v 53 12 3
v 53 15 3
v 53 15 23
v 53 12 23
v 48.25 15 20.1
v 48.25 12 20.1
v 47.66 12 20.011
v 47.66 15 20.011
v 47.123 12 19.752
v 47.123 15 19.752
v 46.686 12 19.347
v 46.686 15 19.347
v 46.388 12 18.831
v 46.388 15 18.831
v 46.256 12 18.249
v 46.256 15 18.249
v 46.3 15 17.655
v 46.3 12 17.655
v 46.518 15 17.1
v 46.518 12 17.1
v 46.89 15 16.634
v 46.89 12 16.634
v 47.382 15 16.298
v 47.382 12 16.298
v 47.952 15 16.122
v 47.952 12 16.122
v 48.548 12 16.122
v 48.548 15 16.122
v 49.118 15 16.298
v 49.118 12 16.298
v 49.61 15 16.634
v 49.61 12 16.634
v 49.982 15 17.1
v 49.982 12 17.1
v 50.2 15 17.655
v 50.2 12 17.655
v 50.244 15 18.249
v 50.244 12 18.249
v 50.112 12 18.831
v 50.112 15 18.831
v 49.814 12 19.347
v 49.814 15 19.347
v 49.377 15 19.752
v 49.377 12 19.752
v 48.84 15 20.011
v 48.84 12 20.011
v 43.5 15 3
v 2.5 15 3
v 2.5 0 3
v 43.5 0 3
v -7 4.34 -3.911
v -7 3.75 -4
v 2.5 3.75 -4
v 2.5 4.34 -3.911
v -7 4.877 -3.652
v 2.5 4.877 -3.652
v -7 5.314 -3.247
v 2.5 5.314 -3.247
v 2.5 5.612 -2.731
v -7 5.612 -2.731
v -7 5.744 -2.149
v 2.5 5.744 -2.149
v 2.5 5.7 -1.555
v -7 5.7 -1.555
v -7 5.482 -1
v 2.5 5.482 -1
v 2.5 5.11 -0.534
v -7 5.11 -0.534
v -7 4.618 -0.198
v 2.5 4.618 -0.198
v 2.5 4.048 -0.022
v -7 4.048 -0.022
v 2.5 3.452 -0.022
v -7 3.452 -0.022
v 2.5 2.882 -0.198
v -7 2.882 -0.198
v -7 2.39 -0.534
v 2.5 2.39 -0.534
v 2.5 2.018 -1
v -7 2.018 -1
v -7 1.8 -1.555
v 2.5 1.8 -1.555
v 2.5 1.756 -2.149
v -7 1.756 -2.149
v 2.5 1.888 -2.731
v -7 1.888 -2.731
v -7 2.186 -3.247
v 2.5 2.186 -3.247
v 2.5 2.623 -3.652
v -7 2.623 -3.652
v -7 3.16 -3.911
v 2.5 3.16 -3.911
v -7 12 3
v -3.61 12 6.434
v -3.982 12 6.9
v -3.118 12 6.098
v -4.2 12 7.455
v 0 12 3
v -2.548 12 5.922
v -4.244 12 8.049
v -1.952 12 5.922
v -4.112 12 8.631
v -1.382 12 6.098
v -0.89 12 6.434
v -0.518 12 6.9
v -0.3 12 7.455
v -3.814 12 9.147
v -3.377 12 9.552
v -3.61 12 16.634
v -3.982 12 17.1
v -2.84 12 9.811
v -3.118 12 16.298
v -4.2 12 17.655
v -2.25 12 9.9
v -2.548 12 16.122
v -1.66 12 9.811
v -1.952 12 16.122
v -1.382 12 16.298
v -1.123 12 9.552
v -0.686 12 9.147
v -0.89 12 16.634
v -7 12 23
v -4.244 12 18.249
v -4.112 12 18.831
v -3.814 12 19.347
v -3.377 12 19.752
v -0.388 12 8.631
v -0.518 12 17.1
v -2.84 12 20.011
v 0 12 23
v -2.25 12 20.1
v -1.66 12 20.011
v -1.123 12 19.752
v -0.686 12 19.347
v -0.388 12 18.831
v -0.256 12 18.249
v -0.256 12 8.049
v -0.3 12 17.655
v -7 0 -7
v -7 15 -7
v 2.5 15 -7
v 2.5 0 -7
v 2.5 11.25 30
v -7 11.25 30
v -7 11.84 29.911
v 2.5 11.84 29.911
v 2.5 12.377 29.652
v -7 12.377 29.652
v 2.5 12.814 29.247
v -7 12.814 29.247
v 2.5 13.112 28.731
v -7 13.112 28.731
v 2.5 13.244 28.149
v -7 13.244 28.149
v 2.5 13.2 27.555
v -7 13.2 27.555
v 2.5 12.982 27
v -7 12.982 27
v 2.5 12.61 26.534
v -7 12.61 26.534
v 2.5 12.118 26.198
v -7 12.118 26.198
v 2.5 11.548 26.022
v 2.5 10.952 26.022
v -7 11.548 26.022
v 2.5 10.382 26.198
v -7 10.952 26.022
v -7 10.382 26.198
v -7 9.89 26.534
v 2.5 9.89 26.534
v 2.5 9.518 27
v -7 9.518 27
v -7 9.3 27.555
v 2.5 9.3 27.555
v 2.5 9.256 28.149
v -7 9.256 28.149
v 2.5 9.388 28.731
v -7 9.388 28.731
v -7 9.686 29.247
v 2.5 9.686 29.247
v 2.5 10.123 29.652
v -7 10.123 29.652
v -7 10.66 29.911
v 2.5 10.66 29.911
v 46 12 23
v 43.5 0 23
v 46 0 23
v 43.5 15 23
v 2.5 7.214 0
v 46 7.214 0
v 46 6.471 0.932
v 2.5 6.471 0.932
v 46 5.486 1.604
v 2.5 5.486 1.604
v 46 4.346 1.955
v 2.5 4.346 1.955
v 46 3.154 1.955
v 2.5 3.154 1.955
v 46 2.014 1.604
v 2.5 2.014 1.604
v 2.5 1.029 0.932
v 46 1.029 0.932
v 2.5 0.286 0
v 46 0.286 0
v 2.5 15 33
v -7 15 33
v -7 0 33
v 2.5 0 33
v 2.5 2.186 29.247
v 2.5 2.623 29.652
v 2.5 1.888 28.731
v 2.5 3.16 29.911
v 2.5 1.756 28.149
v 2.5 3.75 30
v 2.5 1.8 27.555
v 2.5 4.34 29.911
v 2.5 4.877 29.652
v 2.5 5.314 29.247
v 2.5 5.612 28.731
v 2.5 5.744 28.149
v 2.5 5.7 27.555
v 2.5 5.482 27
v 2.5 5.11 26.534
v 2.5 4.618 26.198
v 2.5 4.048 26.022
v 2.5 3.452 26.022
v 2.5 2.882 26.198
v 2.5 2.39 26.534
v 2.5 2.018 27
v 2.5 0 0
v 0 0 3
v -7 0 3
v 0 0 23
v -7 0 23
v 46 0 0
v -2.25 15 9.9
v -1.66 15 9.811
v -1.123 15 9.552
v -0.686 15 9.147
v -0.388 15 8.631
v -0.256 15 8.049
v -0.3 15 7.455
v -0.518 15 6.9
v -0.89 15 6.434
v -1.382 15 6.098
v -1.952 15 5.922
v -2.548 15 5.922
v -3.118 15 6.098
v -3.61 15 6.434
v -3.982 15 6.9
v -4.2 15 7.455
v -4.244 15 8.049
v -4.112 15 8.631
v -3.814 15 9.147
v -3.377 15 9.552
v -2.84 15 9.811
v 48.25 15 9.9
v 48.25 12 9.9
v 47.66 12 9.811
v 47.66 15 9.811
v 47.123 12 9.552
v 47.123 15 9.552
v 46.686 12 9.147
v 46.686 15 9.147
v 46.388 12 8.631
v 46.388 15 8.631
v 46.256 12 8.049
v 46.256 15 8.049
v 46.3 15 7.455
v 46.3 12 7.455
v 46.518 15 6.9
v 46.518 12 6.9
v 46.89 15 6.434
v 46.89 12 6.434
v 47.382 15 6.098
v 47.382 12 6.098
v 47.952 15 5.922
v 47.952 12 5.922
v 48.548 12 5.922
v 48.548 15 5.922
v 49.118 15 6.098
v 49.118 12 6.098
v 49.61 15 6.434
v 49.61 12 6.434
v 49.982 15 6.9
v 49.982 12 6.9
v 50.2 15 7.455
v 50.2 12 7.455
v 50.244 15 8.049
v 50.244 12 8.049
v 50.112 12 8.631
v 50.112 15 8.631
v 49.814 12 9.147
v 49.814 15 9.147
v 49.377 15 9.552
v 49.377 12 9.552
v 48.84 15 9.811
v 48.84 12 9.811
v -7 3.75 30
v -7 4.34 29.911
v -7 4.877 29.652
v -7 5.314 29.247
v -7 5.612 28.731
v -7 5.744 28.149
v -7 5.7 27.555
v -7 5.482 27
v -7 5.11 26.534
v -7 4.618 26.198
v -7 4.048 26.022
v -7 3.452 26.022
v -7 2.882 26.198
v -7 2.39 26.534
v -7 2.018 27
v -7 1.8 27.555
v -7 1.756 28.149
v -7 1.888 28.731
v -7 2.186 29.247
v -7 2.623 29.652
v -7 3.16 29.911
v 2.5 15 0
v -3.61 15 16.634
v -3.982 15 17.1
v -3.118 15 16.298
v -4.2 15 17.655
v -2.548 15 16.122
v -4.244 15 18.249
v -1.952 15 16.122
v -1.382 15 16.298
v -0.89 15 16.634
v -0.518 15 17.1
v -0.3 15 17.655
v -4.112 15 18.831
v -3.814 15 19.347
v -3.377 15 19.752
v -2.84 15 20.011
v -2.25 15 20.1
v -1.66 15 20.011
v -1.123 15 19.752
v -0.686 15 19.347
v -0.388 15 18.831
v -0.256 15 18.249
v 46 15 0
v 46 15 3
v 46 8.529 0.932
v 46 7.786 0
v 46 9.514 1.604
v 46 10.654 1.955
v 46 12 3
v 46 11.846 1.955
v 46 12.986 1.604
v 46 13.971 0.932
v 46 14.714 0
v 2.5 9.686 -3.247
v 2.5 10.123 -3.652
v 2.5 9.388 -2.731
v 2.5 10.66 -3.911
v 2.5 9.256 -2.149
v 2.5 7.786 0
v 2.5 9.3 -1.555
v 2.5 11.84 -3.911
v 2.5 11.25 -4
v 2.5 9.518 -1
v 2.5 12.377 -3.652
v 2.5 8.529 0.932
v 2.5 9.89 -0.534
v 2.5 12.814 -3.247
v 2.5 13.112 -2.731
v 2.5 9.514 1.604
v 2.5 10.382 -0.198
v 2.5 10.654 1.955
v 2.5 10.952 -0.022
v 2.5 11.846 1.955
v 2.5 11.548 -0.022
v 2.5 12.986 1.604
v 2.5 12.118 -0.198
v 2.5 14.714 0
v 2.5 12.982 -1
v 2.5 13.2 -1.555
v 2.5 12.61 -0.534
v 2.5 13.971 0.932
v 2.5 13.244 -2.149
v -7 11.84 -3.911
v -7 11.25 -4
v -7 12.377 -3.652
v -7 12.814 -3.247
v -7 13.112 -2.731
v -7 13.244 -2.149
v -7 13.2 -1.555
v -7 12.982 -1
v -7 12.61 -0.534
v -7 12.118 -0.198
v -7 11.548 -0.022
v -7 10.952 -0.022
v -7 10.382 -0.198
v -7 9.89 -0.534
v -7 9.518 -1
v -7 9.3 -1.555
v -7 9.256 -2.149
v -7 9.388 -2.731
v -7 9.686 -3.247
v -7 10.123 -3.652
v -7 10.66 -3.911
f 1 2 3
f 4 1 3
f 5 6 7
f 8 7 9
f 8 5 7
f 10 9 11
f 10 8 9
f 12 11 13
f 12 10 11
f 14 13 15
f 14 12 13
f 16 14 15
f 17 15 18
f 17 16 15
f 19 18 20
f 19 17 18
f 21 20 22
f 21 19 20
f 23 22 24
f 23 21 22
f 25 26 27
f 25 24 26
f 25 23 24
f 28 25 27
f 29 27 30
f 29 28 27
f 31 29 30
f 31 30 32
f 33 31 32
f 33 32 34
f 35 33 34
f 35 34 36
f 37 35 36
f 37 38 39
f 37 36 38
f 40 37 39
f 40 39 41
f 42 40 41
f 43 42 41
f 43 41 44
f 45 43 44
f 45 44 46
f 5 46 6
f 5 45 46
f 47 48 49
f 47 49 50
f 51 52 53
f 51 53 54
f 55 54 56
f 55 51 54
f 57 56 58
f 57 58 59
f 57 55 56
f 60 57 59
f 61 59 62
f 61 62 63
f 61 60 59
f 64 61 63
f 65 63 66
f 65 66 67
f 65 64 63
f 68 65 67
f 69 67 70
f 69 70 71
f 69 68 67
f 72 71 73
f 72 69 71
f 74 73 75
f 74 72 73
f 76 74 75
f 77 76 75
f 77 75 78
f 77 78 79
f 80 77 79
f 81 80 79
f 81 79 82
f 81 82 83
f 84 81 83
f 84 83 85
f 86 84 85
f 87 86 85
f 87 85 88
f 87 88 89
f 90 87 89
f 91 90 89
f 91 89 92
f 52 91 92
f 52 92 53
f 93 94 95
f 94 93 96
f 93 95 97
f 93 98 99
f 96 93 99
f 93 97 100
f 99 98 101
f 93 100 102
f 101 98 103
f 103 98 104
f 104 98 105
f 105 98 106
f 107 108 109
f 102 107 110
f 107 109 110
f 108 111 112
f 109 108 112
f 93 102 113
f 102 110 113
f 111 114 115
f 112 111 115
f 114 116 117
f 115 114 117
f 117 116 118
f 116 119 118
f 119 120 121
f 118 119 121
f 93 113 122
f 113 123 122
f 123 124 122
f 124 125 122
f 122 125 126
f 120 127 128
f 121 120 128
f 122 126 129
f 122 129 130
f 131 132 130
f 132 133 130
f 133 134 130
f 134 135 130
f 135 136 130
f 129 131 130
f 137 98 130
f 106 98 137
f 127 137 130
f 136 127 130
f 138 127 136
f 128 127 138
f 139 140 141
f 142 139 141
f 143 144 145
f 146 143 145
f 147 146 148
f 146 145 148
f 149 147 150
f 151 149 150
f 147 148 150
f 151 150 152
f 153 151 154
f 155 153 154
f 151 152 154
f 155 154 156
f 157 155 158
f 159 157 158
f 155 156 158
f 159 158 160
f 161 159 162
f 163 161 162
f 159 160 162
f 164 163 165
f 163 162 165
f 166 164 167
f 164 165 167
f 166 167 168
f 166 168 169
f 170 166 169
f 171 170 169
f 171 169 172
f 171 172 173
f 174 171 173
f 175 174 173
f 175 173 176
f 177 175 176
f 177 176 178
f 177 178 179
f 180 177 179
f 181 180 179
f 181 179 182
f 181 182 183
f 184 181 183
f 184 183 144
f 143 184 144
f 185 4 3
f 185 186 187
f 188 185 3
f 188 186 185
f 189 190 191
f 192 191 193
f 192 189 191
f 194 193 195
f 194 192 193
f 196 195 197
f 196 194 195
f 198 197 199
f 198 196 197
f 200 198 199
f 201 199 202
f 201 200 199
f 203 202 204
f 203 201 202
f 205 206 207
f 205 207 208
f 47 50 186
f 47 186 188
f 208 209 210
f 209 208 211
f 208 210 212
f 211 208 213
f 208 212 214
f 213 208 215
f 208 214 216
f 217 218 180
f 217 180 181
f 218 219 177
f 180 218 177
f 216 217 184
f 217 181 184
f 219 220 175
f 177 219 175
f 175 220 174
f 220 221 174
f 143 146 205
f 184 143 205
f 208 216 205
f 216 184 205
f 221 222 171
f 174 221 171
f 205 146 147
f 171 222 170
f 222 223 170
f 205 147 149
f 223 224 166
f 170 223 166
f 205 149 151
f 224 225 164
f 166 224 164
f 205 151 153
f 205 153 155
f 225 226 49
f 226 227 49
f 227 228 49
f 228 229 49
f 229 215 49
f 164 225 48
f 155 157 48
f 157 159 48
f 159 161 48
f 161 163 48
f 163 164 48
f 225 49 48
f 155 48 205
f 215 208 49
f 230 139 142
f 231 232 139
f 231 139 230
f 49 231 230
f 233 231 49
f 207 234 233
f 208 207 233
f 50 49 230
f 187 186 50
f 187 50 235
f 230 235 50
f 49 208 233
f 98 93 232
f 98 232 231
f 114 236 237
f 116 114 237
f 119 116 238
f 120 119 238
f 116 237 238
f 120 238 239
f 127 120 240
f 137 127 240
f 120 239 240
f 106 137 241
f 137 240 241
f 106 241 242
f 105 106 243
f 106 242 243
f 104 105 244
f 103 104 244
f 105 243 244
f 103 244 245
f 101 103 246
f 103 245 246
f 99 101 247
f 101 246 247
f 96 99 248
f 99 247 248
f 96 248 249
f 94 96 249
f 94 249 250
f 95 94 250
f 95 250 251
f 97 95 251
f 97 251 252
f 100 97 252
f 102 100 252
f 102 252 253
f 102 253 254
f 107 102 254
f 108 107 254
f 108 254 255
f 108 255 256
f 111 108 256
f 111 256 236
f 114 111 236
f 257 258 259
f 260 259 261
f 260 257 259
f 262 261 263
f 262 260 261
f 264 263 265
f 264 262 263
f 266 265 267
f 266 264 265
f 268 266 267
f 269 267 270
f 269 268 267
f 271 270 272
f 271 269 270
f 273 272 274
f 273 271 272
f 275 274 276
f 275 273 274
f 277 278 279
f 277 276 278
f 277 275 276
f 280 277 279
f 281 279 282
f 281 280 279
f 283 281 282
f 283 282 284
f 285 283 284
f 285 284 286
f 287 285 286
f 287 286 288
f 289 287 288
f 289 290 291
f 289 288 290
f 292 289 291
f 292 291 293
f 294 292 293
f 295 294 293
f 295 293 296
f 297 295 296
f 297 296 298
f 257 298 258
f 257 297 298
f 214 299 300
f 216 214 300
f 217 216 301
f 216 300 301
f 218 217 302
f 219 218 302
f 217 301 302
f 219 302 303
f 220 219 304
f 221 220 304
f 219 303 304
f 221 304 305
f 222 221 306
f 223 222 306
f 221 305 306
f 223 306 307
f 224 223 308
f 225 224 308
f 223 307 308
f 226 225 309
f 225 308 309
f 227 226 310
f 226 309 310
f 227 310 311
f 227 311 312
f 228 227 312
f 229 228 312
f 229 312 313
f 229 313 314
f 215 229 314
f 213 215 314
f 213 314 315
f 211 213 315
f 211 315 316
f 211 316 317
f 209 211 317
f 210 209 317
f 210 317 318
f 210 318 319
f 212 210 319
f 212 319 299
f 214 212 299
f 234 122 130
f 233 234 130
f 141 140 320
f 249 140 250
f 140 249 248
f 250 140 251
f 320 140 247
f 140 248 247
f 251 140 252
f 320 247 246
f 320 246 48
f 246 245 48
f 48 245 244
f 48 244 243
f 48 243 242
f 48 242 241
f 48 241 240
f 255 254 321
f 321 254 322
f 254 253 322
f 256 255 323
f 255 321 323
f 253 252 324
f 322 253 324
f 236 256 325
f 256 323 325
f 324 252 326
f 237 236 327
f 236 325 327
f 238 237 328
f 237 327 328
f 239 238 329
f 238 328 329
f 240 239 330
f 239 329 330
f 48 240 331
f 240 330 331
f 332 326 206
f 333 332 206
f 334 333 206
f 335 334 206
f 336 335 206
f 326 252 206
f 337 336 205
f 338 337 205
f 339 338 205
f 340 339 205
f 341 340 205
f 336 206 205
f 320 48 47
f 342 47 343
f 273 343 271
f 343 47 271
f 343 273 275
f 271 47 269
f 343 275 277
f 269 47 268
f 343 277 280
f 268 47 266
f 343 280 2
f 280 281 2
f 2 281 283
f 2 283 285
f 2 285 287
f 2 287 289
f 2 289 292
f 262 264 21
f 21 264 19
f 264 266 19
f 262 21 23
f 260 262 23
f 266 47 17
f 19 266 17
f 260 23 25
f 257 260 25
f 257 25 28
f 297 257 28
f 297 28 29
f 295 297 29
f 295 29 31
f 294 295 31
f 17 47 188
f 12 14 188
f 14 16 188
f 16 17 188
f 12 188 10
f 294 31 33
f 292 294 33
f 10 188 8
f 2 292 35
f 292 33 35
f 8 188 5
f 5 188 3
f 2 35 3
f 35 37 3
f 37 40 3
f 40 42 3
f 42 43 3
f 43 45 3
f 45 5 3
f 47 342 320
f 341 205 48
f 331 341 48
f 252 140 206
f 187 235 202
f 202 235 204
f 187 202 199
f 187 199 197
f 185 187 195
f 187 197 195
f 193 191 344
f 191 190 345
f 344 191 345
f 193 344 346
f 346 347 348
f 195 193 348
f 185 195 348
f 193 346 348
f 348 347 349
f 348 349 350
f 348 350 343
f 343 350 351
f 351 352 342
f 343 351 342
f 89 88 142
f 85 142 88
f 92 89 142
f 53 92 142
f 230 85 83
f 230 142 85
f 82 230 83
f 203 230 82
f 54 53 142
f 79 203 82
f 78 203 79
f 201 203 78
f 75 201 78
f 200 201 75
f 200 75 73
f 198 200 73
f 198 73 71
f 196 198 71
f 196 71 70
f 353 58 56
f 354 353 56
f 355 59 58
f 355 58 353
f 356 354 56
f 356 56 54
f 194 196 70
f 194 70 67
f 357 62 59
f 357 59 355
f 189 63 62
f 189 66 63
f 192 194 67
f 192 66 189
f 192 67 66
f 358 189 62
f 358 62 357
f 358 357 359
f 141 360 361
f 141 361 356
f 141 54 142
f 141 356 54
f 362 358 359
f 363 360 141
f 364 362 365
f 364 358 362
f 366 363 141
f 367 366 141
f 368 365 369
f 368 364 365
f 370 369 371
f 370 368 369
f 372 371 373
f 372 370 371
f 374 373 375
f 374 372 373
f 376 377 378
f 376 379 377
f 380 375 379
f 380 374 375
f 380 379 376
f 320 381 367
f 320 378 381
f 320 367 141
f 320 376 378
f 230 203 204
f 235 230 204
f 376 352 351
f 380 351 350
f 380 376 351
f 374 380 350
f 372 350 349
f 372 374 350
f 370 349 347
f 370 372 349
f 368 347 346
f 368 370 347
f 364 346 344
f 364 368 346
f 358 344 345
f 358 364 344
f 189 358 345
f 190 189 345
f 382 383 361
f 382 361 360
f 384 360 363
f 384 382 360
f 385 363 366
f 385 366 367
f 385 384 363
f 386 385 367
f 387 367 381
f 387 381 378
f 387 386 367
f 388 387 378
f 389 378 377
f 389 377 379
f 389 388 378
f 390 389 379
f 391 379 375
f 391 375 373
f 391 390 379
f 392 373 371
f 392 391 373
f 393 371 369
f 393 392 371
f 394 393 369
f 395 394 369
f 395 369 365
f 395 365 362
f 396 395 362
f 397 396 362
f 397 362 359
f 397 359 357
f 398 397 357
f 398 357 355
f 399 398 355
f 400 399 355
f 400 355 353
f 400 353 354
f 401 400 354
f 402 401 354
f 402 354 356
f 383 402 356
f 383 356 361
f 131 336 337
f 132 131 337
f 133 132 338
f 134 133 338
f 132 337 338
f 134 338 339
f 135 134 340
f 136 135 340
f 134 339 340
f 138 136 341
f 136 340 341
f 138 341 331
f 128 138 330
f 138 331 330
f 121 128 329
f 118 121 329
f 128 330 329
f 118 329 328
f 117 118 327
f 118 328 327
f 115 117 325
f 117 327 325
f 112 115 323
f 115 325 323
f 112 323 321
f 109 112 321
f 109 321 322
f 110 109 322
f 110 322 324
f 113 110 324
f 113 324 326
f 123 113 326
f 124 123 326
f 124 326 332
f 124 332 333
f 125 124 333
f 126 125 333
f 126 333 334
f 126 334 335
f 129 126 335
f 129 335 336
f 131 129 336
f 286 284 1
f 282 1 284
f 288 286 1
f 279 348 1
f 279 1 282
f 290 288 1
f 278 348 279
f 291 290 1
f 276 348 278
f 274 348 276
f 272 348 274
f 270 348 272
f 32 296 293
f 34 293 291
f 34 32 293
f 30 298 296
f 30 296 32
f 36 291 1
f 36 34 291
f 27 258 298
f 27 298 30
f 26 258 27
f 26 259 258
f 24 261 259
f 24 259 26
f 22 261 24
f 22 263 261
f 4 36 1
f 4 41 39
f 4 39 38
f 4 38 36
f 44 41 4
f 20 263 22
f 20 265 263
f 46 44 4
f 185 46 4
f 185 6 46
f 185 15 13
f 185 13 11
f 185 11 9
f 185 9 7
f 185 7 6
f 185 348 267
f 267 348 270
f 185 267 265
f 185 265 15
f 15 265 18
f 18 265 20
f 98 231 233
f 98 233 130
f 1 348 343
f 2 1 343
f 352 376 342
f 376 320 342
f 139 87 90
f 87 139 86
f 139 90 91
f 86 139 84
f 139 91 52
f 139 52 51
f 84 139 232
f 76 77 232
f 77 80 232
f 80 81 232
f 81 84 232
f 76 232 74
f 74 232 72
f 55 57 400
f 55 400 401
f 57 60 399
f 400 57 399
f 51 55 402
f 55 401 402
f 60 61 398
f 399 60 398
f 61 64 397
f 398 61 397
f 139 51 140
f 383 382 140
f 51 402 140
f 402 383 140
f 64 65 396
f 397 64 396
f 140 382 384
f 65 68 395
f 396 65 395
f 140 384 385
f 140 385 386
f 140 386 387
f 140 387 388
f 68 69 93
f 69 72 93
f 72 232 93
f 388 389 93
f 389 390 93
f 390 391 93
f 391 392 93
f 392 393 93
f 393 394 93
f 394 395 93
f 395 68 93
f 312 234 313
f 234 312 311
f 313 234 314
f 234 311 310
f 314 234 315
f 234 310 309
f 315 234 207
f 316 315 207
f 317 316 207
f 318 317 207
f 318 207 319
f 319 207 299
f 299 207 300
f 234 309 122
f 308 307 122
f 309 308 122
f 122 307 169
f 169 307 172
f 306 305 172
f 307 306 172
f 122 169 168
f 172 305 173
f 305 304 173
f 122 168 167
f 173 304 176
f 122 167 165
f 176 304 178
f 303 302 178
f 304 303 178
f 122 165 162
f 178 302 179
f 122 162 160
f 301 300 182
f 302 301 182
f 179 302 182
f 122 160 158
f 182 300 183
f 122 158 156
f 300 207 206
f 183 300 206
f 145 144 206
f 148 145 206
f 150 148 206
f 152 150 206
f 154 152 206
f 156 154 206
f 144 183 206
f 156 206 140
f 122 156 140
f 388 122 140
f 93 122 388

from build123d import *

# Parameters (mm, degrees)
SKETCH1_W           = 46
SKETCH1_H           = 15
BOSS_EXTRUDE1_DEPTH = 3
SKETCH3_W           = 2.5
SKETCH3_H           = 15
BOSS_EXTRUDE2_DEPTH = 20
SKETCH4_W           = 20
SKETCH4_H           = 3
BOSS_EXTRUDE3_DEPTH = 7
SKETCH5_R           = 2
CUT_EXTRUDE1_DEPTH  = 7
SKETCH7_W           = 9.5
SKETCH7_H           = 15
BOSS_EXTRUDE4_DEPTH = 10
SKETCH8_R           = 2
CUT_EXTRUDE2_DEPTH  = 10
CUT_EXTRUDE3_DEPTH  = 43.5


with BuildPart() as part:
    # Sketch1 → Boss-Extrude1 (new body)
    with BuildSketch(Plane.XY):
        with Locations((23, 7.5)):
            Rectangle(SKETCH1_W, SKETCH1_H)
    extrude(amount=BOSS_EXTRUDE1_DEPTH)

    # Sketch3 → Boss-Extrude2 (add)
    with BuildSketch(Plane.XY.offset(3)):
        with Locations((1.25, 7.5)):
            Rectangle(SKETCH3_W, SKETCH3_H)
    boss_extrude2 = extrude(amount=BOSS_EXTRUDE2_DEPTH)

    # Sketch4 → Boss-Extrude3 (add)
    with BuildSketch(Plane.ZY):
        with Locations((13, 13.5)):
            Rectangle(SKETCH4_W, SKETCH4_H)
    boss_extrude3 = extrude(amount=BOSS_EXTRUDE3_DEPTH)

    # Sketch5 → Cut-Extrude1 (cut)
    with BuildSketch(Plane(origin=(0, 15, 0), x_dir=(1, 0, 0), z_dir=(0, 1, 0))):
        with Locations(Location((-2.25, -18.1, 0), (0, 0, 270))):
            Circle(SKETCH5_R)
        with Locations(Location((-2.25, -7.9, 0), (0, 0, 270))):
            Circle(SKETCH5_R)
    cut_extrude1 = extrude(amount=-CUT_EXTRUDE1_DEPTH, mode=Mode.SUBTRACT)

    # Mirror1: Boss-Extrude2, Boss-Extrude3, Cut-Extrude1 across plane
    add(boss_extrude2.mirror(Plane(origin=(23, 0, 0), x_dir=(0, 0, 1), z_dir=(1, 0, 0))))
    add(boss_extrude3.mirror(Plane(origin=(23, 0, 0), x_dir=(0, 0, 1), z_dir=(1, 0, 0))))
    add(cut_extrude1.mirror(Plane(origin=(23, 0, 0), x_dir=(0, 0, 1), z_dir=(1, 0, 0))), mode=Mode.SUBTRACT)

    # Sketch7 → Boss-Extrude4 (add)
    with BuildSketch(Plane.XY.offset(23)):
        with Locations((-2.25, 7.5)):
            Rectangle(SKETCH7_W, SKETCH7_H)
    boss_extrude4 = extrude(amount=BOSS_EXTRUDE4_DEPTH)

    # Sketch8 → Cut-Extrude2 (cut)
    with BuildSketch(Plane.ZY.offset(7)):
        with Locations((28, 11.25)):
            Circle(SKETCH8_R)
        with Locations((28, 3.75)):
            Circle(SKETCH8_R)
    cut_extrude2 = extrude(amount=-CUT_EXTRUDE2_DEPTH, mode=Mode.SUBTRACT)

    # Mirror4: Boss-Extrude4, Cut-Extrude2 across plane
    add(boss_extrude4.mirror(Plane.XY.offset(13)))
    add(cut_extrude2.mirror(Plane.XY.offset(13)), mode=Mode.SUBTRACT)

    # Sketch9 → Cut-Extrude3 (cut)
    with BuildSketch(Plane(origin=(2.5, 0, 0), x_dir=(0, 0, -1), z_dir=(1, 0, 0))):
        with BuildLine():
            ThreePointArc((0.608058909, 7.5), (2, -0.25), (3.391941091, 7.5))
            ThreePointArc((3.391941091, 7.5), (2, 15.25), (0.608058909, 7.5))
        make_face()
    extrude(amount=CUT_EXTRUDE3_DEPTH, mode=Mode.SUBTRACT)


solid = part.part
